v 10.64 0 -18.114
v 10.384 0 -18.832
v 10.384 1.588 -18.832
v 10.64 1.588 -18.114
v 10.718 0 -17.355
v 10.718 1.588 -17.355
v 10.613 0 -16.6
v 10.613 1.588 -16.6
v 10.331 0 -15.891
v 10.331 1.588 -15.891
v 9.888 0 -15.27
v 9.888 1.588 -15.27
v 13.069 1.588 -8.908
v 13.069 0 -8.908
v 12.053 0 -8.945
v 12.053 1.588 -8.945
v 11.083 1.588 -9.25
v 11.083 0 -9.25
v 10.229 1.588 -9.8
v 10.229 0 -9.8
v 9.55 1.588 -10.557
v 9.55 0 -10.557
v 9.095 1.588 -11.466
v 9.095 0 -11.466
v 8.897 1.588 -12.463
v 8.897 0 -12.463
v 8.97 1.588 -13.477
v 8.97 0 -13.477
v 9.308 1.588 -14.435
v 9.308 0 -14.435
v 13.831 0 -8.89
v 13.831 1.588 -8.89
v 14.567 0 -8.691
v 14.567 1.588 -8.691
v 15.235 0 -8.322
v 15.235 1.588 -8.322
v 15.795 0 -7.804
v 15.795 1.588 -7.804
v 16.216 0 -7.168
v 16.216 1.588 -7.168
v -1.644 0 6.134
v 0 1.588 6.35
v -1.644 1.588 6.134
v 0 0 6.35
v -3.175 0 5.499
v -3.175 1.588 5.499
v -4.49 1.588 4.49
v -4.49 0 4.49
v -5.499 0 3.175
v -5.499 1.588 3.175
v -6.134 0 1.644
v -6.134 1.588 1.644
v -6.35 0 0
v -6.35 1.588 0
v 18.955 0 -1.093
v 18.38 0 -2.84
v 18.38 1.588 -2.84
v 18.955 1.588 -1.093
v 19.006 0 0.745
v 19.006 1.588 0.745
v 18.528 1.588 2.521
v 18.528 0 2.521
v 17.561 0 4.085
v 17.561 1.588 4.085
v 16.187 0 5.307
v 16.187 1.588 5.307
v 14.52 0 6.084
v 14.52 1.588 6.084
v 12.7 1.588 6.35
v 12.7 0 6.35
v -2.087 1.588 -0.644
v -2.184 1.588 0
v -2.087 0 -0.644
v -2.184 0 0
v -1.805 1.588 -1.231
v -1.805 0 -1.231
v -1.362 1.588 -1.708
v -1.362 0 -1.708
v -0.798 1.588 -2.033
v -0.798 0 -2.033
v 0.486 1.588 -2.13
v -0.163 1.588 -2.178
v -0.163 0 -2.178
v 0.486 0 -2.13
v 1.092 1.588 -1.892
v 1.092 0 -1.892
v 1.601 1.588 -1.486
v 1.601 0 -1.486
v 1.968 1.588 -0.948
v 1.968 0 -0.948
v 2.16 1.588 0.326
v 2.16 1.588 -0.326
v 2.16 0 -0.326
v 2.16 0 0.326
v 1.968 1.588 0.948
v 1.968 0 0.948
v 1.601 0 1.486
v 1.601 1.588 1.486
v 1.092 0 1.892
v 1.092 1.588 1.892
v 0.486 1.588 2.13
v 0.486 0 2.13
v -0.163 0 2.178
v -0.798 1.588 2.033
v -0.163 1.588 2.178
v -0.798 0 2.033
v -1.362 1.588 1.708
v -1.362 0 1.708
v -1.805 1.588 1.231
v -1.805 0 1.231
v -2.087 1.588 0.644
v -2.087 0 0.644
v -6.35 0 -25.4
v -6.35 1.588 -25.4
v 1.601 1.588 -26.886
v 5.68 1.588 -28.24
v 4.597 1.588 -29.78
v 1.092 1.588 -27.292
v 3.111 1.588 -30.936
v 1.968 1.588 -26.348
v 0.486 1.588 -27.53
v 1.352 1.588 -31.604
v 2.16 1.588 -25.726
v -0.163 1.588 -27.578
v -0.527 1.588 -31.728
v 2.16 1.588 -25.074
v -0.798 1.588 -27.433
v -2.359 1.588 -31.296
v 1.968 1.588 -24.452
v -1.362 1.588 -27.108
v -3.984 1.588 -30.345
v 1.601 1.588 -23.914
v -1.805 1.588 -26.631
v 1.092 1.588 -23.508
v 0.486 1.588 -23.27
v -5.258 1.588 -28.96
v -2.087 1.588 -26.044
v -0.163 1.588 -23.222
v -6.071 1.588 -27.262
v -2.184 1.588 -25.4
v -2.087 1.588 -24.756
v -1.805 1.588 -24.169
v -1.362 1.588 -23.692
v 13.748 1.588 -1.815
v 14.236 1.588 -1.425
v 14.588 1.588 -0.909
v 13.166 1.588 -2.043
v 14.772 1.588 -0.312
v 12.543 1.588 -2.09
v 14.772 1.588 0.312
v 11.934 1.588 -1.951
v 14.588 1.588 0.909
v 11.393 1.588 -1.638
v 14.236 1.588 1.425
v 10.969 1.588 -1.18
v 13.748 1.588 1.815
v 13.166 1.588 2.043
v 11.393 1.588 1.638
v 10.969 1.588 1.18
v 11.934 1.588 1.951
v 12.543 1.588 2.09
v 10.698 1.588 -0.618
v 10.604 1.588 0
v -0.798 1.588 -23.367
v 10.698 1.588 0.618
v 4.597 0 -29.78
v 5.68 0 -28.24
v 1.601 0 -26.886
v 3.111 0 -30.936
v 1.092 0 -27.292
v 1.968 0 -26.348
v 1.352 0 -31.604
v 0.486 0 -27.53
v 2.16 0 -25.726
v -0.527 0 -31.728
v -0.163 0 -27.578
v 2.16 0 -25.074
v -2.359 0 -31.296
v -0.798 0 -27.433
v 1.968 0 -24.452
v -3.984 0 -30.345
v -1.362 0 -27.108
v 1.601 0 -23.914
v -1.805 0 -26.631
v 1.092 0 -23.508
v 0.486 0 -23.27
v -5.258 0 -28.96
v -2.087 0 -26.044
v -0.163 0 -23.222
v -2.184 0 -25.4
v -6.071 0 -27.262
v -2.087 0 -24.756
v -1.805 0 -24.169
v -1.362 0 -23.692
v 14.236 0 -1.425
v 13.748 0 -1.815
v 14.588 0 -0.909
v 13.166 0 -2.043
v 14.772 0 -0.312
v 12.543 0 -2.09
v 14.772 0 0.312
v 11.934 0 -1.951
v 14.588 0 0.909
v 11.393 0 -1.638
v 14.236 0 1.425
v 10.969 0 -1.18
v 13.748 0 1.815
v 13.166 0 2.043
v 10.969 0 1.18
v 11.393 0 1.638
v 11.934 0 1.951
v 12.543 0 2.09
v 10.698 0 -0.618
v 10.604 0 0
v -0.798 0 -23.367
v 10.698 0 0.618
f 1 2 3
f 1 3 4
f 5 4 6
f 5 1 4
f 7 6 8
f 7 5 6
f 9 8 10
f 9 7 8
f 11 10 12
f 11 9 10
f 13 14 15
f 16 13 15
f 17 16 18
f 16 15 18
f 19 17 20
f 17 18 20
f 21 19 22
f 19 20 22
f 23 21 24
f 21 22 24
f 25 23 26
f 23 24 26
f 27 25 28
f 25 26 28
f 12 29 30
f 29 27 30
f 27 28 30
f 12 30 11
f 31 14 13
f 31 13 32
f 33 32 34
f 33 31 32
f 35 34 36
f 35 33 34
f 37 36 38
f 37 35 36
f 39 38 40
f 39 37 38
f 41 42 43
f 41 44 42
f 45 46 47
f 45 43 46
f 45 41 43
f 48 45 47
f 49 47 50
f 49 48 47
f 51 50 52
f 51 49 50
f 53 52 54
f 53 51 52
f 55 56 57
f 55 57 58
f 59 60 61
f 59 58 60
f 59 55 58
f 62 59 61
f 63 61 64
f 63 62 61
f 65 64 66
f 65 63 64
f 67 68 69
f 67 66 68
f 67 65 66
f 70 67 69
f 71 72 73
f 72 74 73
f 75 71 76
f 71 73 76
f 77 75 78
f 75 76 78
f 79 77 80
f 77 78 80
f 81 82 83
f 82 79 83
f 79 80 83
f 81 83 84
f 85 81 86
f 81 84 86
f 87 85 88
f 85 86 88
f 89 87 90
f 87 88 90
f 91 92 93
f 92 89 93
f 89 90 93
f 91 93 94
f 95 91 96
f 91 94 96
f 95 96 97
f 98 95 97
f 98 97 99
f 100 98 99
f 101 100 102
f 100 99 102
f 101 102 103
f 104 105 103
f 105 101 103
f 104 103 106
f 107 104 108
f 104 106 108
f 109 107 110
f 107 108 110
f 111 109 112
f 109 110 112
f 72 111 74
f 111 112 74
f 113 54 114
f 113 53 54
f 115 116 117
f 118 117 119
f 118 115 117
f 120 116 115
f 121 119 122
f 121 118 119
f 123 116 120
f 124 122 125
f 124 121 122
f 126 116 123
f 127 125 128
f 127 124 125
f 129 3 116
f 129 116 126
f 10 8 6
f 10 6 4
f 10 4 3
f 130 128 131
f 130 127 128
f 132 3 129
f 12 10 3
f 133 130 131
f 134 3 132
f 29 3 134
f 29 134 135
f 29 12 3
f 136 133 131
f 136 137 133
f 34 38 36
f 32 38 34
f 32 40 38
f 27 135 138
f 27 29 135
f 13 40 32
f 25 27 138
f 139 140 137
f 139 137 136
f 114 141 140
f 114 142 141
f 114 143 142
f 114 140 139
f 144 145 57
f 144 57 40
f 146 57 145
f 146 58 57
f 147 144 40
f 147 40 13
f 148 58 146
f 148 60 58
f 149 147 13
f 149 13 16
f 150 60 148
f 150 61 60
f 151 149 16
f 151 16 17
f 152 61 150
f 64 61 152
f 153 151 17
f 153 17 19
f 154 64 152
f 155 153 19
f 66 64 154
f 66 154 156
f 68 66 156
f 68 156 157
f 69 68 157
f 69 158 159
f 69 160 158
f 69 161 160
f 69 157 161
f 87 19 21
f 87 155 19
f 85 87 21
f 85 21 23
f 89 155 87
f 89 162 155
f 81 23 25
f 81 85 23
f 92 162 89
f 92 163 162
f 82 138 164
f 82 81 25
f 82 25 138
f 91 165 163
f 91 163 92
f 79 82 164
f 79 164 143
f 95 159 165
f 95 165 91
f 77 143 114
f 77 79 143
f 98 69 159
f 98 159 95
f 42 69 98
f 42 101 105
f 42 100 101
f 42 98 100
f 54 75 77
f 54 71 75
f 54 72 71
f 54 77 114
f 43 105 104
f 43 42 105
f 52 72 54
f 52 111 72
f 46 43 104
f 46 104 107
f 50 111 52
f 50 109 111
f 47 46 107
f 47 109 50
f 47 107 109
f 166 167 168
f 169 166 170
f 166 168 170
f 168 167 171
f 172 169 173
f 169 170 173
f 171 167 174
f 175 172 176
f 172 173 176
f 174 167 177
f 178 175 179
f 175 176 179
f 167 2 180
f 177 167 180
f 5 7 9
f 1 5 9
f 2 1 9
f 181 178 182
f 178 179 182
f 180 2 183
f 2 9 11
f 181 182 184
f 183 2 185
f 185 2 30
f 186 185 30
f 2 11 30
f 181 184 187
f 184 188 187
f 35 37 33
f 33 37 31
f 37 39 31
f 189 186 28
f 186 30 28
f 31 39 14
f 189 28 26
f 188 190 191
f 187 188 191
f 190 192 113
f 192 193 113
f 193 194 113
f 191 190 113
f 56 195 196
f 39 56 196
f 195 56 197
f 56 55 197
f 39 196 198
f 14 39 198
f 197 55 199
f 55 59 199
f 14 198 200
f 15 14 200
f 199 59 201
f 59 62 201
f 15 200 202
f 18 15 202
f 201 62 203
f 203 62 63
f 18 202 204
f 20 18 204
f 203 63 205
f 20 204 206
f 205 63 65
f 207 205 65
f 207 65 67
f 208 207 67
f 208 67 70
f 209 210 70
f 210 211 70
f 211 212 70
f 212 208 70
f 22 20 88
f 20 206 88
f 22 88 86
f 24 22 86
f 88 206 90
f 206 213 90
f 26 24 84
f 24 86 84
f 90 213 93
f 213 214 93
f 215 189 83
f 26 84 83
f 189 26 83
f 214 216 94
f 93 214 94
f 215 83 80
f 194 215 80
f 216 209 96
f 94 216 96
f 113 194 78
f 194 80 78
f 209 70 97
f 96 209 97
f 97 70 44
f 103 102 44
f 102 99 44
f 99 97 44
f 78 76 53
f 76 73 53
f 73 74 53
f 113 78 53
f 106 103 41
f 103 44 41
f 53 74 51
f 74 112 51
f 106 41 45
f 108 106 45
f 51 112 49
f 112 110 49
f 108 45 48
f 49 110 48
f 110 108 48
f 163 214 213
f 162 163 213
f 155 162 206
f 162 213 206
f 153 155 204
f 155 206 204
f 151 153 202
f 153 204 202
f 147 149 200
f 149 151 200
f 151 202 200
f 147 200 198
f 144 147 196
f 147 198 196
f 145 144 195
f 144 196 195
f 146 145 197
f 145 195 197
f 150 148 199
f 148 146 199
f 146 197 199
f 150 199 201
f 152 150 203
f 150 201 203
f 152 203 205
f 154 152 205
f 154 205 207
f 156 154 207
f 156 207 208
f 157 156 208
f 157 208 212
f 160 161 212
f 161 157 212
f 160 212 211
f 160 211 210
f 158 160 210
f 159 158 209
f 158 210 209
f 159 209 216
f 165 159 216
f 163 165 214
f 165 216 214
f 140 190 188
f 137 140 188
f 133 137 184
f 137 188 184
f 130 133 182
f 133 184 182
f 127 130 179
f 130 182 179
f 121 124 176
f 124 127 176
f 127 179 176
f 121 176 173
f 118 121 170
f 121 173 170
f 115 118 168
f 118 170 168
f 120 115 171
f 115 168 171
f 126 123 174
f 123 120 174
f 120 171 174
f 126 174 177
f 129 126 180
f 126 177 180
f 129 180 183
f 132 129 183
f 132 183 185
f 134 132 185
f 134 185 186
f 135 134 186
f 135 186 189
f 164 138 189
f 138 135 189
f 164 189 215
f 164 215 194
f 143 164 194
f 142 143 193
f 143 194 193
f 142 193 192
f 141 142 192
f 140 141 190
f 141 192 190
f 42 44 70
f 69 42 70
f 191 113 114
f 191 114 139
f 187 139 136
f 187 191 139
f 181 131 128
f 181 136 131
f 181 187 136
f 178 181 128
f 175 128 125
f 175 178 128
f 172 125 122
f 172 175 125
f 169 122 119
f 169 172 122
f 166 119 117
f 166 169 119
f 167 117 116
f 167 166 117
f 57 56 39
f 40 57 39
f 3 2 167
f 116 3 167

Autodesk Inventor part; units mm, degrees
ref_plane "YZ Plane" through (0, 0, 0) normal (1, 0, 0) x (0, 1, 0)
ref_plane "XZ Plane" through (0, 0, 0) normal (0, 1, 0) x (-1, 0, 0)
ref_plane "XY Plane" through (0, 0, 0) normal (0, 0, 1) x (1, 0, 0)
sketch "Sketch1" plane through (0, 0, 0) normal (0, 1, 0) x (-1, 0, 0)
  circle A0 centre (0, 0) radius 2.1844
  circle A1 centre (0, -25.4) radius 2.1844
  arc A2 (6.35, 0) -> (0, 6.35) centre (0, 0) ccw
  arc A3 (-5.6796, -28.2398) -> (6.35, -25.4) centre (0, -25.4) ccw
  line L0 (6.35, 0) -> (6.35, -25.4)
  circle A4 centre (-12.7, 0) radius 2.0955
  arc A5 (-12.7, 6.35) -> (-18.3796, -2.8398) centre (-12.7, 0) ccw
  line L1 (0, 6.35) -> (-12.7, 6.35)
  arc A6 (-9.8875, -15.2702) -> (-13.0687, -8.9079) centre (-12.7, -12.7) ccw
  line L2 (-18.3796, -2.8398) -> (-16.2157, -7.1677)
  line L3 (-10.3835, -18.8319) -> (-5.6796, -28.2398)
  arc A7 (-9.8875, -15.2702) -> (-10.3835, -18.8319) centre (-7.5437, -17.412) ccw
  arc A8 (-16.2157, -7.1677) -> (-13.0687, -8.9079) centre (-13.3759, -5.7478) ccw
  point P0 (-14.9769, -9.6452)
  point P1 (-11.6223, -16.3544)
  dimension "d0" = 4.3688
  dimension "d1" = 12.7
  dimension "d2" = 4.191
  dimension "d5" = 7.62
  dimension "d6" = 3.175
extrude "Extrusion1" add sketch "Sketch1" along normal blind 1.5875
equation "\"BendRadius\" = Thickness"
equation "\"BendReliefWidth\" = Thickness"
equation "\"BendReliefDepth\" = 0.5 * Thickness"
equation "\"CornerReliefSize\" = 4 * Thickness"
equation "\"MinimumRemnant\" = 2 * Thickness"
equation "\"TransitionRadius\" = BendRadius"
equation "\"JacobiRadiusSize\" = BendRadius"
equation "\"GapSize\" = Thickness"
equation "\"Thickness\" = 1.5875"
properties part number "wing_pivot" material "Acetal Resin, White"
